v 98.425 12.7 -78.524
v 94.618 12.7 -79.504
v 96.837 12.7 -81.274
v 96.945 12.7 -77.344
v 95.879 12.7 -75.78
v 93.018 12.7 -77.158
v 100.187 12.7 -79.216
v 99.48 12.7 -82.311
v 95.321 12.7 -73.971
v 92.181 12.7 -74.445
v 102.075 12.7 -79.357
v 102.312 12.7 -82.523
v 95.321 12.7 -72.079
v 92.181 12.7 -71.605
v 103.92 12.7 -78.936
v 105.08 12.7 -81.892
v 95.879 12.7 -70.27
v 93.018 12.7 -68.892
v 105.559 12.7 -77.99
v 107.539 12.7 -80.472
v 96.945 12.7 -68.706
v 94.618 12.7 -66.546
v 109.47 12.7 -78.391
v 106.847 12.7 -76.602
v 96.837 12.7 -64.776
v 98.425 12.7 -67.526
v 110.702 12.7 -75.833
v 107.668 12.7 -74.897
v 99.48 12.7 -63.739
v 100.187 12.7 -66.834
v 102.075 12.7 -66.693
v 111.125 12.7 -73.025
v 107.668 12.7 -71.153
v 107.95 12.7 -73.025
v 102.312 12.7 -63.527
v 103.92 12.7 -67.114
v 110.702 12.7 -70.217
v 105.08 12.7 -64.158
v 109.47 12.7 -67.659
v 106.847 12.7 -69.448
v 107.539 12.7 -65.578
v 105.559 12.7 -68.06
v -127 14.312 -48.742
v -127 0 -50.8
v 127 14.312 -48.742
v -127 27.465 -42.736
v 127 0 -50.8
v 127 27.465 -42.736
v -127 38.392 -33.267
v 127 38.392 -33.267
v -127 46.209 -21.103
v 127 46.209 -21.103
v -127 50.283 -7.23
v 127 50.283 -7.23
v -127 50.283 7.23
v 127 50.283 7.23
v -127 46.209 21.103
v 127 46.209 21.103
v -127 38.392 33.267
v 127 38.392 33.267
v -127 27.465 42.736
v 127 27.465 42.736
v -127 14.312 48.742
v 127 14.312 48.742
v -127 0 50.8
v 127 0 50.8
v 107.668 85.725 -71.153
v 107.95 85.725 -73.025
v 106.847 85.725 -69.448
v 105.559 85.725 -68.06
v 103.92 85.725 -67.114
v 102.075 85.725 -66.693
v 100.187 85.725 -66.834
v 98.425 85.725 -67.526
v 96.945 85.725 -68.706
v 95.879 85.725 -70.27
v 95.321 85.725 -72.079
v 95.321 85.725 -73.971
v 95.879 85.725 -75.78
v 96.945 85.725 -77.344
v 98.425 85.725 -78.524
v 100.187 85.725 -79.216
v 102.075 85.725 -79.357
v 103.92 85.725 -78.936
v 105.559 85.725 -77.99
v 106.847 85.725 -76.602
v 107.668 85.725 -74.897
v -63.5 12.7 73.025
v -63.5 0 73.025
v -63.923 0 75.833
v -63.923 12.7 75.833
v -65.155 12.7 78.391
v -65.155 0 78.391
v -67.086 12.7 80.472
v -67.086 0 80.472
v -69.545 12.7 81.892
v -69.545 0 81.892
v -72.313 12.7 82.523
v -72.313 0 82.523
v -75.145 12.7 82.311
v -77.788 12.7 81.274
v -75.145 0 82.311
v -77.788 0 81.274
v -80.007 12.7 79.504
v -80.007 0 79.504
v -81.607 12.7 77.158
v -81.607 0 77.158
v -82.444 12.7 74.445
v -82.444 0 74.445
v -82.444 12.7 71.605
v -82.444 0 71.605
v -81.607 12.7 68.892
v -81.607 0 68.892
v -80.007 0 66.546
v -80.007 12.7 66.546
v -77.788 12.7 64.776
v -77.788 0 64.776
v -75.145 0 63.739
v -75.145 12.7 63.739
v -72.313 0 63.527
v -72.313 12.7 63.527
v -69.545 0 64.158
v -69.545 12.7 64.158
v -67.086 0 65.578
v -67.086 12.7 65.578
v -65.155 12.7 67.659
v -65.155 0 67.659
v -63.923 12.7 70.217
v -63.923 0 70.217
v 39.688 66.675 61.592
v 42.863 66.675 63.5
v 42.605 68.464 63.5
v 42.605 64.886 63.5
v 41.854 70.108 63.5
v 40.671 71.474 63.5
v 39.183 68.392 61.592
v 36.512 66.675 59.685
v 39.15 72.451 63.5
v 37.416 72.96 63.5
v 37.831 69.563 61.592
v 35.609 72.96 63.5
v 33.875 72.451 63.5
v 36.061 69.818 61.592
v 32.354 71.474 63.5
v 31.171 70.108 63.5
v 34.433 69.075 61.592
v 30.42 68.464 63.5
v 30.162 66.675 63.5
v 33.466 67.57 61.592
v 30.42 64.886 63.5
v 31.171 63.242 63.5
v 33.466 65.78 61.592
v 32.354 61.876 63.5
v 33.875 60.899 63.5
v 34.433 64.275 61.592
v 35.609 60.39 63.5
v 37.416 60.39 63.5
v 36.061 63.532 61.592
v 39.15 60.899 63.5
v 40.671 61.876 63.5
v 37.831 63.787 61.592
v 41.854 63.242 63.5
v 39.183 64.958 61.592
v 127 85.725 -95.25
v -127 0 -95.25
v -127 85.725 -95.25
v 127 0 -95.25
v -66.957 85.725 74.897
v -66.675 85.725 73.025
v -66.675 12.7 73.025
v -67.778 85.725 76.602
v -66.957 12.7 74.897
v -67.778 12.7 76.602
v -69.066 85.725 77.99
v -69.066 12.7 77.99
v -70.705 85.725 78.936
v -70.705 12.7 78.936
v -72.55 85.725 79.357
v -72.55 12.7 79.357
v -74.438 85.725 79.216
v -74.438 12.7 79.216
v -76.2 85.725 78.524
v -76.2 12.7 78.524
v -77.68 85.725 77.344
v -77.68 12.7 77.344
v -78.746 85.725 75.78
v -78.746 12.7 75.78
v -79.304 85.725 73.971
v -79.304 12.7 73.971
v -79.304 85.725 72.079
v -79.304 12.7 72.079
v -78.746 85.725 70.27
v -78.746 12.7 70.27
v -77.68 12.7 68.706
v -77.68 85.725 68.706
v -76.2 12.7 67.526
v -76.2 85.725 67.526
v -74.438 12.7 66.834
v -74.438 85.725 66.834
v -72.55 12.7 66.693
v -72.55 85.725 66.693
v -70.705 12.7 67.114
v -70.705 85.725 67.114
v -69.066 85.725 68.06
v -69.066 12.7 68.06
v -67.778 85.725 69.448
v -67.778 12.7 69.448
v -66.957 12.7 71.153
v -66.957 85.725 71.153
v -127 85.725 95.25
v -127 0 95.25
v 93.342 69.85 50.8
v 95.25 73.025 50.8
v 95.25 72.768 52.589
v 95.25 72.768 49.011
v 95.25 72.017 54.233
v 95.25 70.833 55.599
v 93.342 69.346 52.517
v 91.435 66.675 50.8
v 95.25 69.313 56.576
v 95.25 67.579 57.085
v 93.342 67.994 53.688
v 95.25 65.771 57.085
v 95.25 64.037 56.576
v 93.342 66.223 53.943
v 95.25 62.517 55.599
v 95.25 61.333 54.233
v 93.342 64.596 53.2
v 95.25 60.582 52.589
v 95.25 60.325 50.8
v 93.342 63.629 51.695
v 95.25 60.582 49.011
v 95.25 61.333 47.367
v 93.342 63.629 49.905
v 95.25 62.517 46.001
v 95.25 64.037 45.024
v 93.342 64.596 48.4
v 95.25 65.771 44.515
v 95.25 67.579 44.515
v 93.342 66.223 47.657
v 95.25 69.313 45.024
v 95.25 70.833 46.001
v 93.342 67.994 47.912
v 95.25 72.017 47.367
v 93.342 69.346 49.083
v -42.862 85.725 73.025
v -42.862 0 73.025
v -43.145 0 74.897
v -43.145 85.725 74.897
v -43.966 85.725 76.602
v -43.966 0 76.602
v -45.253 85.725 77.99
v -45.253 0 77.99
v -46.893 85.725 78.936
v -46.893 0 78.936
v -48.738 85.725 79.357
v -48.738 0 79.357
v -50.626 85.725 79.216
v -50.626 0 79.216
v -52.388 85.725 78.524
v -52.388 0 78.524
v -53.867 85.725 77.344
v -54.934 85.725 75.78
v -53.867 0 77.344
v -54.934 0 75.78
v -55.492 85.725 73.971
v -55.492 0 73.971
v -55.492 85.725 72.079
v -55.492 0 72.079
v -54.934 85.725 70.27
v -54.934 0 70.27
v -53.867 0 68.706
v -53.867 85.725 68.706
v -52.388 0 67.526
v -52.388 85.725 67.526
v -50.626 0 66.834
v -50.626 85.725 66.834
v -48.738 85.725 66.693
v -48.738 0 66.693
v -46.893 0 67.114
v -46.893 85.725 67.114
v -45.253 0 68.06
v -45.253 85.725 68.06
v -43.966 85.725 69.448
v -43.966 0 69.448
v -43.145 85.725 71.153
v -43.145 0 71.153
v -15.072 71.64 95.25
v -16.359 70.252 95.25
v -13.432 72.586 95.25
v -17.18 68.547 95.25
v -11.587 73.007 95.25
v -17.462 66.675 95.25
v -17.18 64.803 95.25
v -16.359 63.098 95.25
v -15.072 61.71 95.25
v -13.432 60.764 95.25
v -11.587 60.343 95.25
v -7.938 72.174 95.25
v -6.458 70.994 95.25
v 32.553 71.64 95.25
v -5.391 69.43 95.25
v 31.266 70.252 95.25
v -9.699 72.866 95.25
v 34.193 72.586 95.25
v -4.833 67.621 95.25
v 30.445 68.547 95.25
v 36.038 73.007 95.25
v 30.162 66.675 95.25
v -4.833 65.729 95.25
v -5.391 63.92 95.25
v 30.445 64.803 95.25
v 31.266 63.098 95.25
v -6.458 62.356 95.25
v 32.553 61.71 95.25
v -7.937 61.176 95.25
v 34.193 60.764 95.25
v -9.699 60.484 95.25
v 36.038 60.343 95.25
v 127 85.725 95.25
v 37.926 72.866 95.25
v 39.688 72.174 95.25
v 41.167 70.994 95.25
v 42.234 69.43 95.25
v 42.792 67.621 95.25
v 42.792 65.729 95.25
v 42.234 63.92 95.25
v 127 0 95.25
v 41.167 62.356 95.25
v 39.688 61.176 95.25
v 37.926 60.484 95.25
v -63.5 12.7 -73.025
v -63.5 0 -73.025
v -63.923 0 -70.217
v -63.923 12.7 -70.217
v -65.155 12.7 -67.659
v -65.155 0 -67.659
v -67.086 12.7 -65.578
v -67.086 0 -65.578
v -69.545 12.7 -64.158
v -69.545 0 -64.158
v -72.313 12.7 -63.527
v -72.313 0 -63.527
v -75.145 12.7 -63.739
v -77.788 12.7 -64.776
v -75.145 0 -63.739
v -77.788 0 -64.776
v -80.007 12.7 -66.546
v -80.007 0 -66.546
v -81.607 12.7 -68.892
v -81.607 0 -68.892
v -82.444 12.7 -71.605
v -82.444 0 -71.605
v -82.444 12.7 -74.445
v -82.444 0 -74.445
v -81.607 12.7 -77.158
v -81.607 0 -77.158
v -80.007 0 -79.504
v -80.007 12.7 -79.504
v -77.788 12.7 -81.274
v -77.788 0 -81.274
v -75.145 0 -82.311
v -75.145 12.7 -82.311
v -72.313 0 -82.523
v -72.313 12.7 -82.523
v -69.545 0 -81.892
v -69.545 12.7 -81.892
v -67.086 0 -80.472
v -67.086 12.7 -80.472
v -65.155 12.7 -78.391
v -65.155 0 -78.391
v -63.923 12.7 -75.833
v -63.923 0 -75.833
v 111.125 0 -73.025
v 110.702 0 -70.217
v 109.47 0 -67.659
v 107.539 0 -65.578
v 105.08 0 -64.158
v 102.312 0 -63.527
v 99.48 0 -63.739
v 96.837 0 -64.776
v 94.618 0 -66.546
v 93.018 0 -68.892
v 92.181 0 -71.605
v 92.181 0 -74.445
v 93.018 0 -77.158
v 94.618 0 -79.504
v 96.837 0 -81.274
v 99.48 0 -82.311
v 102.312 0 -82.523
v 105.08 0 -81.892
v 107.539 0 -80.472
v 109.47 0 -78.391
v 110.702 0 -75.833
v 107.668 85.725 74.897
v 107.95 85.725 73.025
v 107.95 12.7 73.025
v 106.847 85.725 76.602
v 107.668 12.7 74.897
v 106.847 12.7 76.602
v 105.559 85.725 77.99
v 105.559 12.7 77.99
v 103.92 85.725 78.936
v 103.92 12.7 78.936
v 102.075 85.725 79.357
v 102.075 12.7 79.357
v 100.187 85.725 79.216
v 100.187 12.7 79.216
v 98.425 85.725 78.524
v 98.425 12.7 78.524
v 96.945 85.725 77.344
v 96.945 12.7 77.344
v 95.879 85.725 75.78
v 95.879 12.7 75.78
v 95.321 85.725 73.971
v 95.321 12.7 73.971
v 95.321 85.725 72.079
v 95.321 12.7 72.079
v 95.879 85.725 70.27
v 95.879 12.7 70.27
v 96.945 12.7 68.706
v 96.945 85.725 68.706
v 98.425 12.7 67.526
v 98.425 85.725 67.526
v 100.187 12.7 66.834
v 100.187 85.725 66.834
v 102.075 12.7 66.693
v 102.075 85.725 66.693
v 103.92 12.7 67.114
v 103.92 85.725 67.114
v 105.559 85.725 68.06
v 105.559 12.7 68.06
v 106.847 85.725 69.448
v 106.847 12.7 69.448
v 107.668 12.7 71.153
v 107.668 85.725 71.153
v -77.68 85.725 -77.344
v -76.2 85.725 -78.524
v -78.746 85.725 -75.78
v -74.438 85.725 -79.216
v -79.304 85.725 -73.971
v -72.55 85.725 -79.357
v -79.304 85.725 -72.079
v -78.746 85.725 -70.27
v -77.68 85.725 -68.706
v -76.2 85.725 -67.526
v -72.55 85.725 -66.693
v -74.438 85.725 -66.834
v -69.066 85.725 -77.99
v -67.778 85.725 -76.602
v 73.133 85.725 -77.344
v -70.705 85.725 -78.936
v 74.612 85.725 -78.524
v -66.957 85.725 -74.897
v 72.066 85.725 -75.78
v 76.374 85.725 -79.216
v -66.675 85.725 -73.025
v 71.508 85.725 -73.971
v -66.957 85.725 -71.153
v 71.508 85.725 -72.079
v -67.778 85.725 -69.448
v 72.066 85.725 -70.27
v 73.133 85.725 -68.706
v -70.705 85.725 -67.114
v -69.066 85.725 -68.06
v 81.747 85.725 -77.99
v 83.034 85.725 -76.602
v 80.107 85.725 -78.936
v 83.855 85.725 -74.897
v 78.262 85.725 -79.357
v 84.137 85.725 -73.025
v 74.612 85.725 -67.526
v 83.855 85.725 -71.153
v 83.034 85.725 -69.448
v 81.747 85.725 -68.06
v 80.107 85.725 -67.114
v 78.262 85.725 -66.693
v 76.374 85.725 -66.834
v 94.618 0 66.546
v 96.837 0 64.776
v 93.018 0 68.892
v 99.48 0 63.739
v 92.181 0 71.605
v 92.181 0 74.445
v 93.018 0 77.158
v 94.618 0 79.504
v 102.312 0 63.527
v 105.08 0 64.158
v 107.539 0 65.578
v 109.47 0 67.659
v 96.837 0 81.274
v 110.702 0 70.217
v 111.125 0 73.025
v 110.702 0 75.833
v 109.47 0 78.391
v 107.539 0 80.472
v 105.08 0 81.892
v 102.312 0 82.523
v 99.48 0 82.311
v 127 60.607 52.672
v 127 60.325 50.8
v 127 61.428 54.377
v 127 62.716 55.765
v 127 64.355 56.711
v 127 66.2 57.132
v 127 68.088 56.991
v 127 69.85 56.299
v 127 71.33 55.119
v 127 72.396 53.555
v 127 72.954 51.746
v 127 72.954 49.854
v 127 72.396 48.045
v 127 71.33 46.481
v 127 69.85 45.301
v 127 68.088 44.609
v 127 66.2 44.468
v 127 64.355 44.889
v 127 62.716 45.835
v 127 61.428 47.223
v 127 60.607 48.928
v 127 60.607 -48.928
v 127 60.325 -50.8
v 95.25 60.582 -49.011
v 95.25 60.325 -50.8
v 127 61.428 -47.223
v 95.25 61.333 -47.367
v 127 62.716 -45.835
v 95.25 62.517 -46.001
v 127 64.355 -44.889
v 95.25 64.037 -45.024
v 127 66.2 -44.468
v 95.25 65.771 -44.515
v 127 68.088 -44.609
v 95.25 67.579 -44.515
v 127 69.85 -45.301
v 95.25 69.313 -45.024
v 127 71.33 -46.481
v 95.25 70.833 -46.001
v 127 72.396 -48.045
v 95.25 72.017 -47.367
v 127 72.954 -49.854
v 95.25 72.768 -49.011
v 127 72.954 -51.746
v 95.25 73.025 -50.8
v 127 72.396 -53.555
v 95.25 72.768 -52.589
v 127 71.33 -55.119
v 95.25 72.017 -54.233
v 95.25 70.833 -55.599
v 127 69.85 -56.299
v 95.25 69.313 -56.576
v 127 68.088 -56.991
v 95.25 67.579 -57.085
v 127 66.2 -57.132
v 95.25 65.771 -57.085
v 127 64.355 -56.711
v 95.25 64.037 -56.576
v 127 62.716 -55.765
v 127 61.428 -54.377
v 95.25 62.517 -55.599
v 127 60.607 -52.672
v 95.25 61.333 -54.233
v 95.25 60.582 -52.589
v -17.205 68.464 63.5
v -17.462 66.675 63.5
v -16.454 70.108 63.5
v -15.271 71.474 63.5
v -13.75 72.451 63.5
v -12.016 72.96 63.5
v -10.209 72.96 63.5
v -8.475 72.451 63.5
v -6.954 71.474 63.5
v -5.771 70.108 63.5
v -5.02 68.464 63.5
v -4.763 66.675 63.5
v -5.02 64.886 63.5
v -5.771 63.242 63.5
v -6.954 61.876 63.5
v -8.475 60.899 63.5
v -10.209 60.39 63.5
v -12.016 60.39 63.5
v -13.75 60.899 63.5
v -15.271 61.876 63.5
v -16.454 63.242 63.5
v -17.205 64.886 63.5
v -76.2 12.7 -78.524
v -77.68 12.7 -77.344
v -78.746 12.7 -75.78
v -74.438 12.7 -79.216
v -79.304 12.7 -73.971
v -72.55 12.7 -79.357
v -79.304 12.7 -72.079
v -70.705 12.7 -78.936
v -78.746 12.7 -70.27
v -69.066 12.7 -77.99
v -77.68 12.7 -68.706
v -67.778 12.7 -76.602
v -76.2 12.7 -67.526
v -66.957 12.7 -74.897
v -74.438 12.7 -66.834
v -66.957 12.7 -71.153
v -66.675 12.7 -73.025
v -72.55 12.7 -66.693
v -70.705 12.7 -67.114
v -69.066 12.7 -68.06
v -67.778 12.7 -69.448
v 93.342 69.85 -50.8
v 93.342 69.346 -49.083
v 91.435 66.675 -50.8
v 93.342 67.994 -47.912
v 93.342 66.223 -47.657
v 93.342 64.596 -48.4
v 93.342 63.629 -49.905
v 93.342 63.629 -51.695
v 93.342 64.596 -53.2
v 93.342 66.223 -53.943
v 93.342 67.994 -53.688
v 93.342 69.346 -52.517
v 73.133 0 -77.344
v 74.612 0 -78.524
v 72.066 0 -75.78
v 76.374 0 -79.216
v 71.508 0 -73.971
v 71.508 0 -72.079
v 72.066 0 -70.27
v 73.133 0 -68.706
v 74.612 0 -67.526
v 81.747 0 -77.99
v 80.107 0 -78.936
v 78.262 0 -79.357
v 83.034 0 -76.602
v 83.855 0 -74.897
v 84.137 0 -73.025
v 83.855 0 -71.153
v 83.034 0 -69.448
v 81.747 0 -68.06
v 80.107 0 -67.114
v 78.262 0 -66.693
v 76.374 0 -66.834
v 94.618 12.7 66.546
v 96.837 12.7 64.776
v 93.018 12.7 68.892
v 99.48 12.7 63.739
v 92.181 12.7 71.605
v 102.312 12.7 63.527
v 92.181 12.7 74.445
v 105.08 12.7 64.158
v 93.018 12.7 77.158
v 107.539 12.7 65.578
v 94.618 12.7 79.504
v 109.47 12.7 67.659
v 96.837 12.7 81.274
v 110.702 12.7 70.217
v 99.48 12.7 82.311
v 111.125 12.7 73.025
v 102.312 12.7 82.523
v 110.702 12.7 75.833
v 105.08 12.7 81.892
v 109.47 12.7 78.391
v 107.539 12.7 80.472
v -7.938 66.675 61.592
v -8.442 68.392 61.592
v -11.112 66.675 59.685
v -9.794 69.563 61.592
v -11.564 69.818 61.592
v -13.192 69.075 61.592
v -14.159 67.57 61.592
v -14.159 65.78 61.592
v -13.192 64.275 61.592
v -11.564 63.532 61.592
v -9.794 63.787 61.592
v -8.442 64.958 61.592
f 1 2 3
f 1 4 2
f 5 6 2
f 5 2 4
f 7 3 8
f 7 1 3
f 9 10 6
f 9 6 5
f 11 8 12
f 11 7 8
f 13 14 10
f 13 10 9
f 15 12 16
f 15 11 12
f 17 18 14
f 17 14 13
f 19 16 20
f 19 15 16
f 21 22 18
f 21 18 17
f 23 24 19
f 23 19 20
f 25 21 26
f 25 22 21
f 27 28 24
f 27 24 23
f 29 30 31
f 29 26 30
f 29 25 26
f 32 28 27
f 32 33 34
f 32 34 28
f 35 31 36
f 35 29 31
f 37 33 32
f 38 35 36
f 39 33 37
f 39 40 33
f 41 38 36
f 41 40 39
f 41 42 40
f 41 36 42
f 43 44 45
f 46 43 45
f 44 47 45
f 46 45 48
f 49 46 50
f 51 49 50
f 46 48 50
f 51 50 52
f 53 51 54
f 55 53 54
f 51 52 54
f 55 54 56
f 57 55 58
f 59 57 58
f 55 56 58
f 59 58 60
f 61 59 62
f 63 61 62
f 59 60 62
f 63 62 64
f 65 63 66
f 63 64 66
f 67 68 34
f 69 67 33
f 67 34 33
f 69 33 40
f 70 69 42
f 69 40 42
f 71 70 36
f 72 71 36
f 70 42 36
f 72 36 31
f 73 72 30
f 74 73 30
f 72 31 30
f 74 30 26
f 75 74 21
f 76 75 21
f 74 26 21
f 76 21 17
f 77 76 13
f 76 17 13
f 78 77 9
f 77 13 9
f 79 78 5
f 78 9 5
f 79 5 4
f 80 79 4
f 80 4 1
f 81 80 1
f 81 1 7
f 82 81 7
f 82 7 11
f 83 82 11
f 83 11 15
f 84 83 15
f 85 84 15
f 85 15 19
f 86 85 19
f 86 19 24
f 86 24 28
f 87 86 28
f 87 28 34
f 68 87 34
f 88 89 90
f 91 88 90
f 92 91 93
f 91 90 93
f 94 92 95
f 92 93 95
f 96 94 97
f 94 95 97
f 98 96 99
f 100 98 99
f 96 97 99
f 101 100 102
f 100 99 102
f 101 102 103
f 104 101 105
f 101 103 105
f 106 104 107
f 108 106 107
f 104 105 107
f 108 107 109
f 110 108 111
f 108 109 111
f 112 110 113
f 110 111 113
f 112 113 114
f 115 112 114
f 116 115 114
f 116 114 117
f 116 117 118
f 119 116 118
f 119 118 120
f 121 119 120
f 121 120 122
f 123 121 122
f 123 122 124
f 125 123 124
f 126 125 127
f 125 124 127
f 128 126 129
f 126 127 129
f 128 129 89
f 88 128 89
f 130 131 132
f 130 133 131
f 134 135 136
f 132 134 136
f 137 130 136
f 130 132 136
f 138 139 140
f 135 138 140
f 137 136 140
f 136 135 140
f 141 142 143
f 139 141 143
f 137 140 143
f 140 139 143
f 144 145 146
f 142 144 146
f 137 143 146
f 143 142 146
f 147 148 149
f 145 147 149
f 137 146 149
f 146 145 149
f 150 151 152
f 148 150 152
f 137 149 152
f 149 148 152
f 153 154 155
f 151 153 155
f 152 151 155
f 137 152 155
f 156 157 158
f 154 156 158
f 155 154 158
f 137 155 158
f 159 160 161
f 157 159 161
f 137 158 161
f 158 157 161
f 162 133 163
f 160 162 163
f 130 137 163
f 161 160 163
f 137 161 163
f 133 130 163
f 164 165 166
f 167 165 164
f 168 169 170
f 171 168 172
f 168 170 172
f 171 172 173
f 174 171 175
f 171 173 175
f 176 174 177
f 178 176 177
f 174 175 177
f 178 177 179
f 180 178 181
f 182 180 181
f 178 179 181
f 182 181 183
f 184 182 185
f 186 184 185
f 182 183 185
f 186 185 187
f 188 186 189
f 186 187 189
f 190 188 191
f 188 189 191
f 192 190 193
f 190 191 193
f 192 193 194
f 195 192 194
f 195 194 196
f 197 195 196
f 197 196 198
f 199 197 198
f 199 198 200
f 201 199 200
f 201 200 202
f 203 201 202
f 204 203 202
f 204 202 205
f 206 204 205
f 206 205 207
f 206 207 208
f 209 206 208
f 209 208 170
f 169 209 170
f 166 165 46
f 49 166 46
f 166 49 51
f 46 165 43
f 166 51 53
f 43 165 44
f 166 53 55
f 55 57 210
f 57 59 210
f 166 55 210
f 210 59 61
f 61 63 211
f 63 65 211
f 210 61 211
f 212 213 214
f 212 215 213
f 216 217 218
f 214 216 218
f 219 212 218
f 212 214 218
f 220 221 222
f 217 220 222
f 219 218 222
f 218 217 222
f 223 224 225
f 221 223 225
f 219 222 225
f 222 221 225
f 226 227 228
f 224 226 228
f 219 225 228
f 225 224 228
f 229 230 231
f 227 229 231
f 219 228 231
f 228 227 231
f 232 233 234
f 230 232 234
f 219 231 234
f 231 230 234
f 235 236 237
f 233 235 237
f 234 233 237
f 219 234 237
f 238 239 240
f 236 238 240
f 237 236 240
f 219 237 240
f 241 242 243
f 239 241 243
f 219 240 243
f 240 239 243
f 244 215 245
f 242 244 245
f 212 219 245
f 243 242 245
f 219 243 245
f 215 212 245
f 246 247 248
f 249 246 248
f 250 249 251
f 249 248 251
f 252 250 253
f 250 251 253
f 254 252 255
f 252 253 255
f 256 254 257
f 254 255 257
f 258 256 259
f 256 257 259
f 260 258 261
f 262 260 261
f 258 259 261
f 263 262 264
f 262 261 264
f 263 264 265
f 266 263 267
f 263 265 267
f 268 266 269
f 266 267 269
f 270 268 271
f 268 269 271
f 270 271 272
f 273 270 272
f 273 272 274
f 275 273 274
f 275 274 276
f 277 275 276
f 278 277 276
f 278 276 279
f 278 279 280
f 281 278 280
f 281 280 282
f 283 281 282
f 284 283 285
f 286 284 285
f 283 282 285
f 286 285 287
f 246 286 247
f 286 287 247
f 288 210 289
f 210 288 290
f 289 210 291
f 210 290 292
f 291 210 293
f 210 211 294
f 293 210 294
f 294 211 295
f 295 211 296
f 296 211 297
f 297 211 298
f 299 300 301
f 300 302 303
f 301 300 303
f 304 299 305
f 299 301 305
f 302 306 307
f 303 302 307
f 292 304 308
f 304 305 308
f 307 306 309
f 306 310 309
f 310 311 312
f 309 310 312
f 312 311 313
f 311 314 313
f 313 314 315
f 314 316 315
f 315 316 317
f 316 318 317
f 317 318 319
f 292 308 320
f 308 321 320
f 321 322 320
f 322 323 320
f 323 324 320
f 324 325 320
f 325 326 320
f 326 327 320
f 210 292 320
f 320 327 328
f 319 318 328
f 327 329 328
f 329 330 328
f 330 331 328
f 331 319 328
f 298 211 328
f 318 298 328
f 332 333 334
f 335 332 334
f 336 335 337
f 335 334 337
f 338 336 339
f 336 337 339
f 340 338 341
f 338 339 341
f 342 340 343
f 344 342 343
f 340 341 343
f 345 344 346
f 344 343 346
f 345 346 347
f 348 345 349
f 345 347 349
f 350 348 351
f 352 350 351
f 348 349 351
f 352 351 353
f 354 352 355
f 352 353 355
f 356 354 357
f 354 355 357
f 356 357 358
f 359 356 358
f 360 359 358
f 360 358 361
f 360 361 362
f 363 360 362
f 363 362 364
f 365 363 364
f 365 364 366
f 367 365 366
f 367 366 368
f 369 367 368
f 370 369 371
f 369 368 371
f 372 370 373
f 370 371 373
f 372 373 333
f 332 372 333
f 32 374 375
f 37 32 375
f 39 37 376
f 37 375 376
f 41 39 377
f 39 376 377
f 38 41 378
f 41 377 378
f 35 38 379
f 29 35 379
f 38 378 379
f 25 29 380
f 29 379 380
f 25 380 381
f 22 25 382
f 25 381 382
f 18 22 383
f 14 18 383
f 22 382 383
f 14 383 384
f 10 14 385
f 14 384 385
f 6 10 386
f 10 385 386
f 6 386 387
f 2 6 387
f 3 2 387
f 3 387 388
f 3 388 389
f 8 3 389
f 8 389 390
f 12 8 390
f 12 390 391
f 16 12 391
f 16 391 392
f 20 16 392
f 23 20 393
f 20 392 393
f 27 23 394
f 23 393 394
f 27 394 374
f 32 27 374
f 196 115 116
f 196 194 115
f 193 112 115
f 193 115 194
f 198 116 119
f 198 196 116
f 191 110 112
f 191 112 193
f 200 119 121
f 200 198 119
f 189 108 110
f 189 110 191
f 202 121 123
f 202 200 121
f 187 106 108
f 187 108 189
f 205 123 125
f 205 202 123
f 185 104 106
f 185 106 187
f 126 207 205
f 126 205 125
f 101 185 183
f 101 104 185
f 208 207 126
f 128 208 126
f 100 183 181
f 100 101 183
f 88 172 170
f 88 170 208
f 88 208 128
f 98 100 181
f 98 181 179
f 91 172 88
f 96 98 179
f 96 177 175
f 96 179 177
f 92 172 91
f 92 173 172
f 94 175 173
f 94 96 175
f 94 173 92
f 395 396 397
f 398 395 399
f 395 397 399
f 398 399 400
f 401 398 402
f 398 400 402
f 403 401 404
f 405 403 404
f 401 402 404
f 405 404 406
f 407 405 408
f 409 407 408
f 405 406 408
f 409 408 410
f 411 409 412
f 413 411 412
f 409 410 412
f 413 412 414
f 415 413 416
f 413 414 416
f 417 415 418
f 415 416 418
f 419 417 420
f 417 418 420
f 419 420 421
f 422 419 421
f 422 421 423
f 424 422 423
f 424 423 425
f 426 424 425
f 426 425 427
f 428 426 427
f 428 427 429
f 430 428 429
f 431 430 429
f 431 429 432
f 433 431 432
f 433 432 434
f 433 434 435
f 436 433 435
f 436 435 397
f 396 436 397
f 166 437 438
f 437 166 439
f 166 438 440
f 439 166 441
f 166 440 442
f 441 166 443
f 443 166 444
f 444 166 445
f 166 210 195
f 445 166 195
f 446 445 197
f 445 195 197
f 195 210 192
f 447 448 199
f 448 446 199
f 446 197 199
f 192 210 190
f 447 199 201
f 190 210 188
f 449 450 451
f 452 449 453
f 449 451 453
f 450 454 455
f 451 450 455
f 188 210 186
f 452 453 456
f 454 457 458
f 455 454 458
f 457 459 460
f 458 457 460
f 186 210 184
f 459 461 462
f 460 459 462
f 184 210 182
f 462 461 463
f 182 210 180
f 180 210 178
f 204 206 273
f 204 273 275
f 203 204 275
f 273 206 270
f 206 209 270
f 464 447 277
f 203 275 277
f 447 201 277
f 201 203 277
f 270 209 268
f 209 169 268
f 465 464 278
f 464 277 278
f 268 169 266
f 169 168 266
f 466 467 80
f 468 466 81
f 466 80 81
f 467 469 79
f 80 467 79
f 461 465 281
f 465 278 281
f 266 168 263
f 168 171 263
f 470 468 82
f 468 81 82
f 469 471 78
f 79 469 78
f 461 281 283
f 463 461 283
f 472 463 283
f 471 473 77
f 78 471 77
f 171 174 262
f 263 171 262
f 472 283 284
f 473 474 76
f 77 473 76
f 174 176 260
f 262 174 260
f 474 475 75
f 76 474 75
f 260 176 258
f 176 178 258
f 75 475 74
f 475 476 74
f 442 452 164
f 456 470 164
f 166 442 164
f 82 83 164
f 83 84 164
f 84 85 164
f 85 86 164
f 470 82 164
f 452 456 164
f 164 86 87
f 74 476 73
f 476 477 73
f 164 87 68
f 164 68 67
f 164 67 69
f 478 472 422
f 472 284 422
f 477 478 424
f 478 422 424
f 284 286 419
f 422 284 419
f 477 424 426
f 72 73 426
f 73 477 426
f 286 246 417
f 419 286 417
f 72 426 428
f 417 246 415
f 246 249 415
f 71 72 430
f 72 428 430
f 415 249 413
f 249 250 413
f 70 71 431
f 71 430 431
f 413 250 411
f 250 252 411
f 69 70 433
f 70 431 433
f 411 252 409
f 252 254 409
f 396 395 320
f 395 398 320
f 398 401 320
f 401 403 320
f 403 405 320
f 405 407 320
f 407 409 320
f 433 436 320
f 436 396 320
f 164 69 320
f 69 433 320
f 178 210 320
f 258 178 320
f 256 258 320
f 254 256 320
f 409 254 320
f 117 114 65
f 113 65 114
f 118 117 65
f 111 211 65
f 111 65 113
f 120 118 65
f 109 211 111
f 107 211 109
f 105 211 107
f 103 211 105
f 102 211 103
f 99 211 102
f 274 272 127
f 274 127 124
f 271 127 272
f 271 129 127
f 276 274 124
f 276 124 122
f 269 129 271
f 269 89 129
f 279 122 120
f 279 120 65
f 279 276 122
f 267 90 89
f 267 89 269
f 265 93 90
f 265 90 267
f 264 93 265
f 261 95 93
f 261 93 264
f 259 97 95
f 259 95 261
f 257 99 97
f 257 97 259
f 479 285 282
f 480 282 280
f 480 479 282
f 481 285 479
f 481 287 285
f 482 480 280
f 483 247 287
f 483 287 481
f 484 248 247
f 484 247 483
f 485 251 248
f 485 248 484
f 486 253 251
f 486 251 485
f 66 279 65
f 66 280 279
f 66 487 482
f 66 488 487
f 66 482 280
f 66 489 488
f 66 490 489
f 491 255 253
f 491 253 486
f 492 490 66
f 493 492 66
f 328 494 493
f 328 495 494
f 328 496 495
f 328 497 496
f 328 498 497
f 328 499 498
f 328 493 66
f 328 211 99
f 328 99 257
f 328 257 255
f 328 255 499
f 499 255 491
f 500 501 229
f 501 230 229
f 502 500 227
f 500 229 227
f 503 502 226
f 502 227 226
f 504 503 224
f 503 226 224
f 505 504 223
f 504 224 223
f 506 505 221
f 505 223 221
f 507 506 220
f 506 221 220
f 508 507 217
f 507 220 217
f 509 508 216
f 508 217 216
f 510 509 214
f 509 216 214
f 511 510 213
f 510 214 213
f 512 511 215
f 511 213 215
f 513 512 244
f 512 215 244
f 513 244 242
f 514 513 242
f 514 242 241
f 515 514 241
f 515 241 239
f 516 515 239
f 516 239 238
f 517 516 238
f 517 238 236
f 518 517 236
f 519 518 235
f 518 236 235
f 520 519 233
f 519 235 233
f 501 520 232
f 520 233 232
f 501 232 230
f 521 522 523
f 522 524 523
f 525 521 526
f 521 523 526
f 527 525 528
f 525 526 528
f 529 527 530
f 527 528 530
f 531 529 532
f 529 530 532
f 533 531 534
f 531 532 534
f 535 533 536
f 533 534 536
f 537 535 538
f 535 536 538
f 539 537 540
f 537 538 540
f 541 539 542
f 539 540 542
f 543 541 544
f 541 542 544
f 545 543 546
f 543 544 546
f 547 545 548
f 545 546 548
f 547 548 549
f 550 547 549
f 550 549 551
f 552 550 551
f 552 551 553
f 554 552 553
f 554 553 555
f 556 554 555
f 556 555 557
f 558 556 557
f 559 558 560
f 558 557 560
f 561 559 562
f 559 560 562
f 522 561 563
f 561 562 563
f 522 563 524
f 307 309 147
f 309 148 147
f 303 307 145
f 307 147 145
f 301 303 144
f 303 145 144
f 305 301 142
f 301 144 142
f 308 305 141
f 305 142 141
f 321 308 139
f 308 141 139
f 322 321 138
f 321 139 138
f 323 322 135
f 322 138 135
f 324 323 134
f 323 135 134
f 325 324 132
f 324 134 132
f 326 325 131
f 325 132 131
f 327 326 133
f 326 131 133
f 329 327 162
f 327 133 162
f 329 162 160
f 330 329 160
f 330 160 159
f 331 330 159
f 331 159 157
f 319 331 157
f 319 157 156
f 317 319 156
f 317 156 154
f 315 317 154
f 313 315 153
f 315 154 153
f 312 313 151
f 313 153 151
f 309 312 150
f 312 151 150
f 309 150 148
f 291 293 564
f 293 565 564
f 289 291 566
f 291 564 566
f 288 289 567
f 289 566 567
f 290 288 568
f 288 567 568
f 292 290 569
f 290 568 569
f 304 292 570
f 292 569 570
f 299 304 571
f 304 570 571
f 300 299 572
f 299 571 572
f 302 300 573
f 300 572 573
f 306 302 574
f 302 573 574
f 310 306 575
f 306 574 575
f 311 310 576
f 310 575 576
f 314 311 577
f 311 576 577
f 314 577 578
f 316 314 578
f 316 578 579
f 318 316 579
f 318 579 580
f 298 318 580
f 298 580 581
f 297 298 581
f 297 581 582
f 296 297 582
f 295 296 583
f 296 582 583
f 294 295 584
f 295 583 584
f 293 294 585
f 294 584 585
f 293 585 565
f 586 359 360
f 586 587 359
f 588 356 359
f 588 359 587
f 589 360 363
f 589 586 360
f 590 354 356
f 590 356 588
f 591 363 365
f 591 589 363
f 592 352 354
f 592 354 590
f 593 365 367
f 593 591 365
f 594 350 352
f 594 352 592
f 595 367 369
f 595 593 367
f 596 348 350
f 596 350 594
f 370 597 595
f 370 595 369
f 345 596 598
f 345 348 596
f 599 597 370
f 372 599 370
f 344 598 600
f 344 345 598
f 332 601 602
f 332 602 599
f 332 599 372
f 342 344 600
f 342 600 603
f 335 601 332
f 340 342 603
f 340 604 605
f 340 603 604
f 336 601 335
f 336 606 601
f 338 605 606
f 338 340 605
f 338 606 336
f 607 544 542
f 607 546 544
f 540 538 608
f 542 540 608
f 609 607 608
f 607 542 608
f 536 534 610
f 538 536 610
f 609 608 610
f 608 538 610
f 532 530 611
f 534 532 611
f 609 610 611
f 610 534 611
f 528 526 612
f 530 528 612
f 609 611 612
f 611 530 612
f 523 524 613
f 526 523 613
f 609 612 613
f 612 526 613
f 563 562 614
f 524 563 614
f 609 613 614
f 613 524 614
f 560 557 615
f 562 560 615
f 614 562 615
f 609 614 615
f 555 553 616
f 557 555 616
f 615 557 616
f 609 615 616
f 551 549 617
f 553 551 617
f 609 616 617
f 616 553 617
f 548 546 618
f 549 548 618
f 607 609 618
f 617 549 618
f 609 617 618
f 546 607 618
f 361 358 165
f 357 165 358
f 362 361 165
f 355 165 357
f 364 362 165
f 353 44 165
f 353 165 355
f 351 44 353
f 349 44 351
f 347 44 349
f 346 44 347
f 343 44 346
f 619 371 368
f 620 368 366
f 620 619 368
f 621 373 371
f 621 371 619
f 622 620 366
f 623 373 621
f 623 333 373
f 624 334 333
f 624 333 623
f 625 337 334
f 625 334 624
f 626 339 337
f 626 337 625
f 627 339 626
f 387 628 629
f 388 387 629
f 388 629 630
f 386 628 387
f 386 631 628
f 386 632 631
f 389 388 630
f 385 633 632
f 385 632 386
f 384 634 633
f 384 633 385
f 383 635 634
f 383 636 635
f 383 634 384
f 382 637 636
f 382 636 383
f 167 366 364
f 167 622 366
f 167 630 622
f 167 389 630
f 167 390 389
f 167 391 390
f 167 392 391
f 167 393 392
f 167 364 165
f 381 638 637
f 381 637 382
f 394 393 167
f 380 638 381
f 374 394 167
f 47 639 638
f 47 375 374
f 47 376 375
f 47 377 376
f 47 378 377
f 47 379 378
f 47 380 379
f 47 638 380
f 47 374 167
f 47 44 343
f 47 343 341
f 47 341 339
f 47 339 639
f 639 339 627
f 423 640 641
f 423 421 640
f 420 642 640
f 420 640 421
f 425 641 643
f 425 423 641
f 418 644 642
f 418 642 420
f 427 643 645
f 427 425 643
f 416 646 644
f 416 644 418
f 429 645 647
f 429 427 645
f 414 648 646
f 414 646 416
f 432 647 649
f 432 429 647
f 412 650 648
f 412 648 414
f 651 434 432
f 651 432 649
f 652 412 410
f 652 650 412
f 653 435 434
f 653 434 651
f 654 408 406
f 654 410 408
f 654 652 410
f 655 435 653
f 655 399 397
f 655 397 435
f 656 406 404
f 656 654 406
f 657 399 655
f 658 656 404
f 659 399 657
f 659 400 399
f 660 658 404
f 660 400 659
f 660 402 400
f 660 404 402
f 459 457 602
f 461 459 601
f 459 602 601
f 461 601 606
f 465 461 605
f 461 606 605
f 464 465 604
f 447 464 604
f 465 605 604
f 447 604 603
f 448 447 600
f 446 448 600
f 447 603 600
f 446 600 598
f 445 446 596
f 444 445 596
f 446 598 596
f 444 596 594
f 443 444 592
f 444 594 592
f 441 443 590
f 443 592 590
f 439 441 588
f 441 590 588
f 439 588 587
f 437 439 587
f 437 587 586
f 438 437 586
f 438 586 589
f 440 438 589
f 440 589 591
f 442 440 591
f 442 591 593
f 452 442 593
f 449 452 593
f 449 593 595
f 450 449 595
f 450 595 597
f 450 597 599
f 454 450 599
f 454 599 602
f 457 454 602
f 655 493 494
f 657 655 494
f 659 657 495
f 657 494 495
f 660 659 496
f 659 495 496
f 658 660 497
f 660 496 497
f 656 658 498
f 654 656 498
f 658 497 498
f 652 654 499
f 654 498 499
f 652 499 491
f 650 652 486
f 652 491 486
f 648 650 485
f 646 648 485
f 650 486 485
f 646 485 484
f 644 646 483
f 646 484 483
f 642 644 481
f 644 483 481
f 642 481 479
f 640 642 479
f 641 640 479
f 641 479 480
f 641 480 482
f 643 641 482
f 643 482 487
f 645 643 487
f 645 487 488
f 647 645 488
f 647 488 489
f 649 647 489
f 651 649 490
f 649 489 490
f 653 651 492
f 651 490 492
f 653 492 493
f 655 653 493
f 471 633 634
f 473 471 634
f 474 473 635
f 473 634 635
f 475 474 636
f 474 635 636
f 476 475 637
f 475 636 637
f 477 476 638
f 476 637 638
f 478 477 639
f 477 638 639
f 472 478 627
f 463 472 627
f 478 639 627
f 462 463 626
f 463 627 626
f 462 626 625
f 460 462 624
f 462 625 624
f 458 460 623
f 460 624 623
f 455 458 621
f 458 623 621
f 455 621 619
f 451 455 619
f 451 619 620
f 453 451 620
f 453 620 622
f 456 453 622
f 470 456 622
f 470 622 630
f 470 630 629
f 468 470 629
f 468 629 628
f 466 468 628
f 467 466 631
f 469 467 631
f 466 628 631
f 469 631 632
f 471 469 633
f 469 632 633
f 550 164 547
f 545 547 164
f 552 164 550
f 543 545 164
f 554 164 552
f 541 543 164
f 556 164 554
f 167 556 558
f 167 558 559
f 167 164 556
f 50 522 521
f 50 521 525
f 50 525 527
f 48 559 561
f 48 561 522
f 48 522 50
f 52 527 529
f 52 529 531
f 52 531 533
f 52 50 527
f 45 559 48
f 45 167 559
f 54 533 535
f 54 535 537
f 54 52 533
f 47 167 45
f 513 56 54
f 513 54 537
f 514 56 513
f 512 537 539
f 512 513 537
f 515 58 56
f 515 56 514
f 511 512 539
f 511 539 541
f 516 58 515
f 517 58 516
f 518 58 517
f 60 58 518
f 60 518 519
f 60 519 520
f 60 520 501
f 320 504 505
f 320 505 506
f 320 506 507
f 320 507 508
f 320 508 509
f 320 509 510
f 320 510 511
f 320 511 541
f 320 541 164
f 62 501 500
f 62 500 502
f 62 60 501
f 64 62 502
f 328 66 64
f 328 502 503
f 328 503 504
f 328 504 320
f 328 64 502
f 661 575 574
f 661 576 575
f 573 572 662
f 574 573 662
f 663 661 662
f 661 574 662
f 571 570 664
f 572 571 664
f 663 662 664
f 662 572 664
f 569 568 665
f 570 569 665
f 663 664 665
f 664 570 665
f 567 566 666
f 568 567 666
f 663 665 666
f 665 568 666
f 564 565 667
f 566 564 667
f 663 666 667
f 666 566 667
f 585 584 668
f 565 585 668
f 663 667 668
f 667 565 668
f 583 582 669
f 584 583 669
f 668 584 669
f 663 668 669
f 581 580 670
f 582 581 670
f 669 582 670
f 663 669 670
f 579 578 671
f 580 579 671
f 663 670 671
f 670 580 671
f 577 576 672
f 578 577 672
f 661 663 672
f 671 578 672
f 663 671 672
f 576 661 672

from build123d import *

# Parameters (mm, degrees)
F0_W      = 254
F0_H      = 190.5
F1_DEPTH  = 85.725
F3_DEPTH  = 127
F4_R      = 9.525
F5_DEPTH  = 12.7
F6_R      = 6.35
F7_DEPTH  = 85.725
F8_R      = 6.35
F9_R      = 6.35
F10_DEPTH = 82.55
F12_D     = 12.7
F12_DEPTH = 31.75
F12_TIP   = 3.8154649308
F14_D     = 12.7
F14_DEPTH = 31.75
F14_TIP   = 3.8154649308


with BuildPart() as f1:
    # F0 (on Front) → F1 (new body)
    with BuildSketch(Plane.XZ):
        Rectangle(F0_W, F0_H)
    extrude(amount=-F1_DEPTH)

    # F2 (on Right) → F3 (cut, symmetric)
    with BuildSketch(Plane.YZ):
        with BuildLine():
            Line((0, 0), (0, -50.8))
            ThreePointArc((0, -50.8), (50.8, 0), (0, 50.8))
            Line((0, 50.8), (0, 0))
        make_face()
    extrude(amount=F3_DEPTH, both=True, mode=Mode.SUBTRACT)

    # F4 (on face) → F5 (cut)
    with BuildSketch(Plane.XZ):
        with Locations((-73.025, 73.025)):
            Circle(F4_R)
        with Locations((-73.025, -73.025)):
            Circle(F4_R)
        with Locations((101.6, 73.025)):
            Circle(F4_R)
        with Locations((101.6, -73.025)):
            Circle(F4_R)
    extrude(amount=-F5_DEPTH, mode=Mode.SUBTRACT)

    # F6 (on face) → F7 (cut, through all)
    with BuildSketch(Plane.XZ):
        with Locations((-49.2125, 73.025)):
            Circle(F6_R)
        with Locations((77.7875, -73.025)):
            Circle(F6_R)
    extrude(amount=-F7_DEPTH, mode=Mode.SUBTRACT)

    # F8 (on face) + F9 (on face) → F10 (cut)
    with BuildSketch(Plane.XZ.offset(-12.7)):
        with Locations((-73.025, 73.025)):
            Circle(F8_R)
        with Locations((-73.025, -73.025)):
            Circle(F8_R)
    with BuildSketch(Plane.XZ.offset(-12.7)):
        with Locations((101.6, 73.025)):
            Circle(F9_R)
        with Locations((101.6, -73.025)):
            Circle(F9_R)
    extrude(amount=-F10_DEPTH, mode=Mode.SUBTRACT)

    # F12
    with Locations(Plane.XY.offset(95.25)):
        with Locations((-11.1125, 66.675), (36.5125, 66.675)):
            Hole(F12_D / 2, depth=F12_DEPTH)
            with Locations((0, 0, -(F12_DEPTH + F12_TIP / 2))):  # 118° drill point
                Cone(0, F12_D / 2, F12_TIP, mode=Mode.SUBTRACT)

    # F14
    with Locations(Plane.YZ.offset(127)):
        with Locations((66.675, 50.8), (66.675, -50.8)):
            Hole(F14_D / 2, depth=F14_DEPTH)
            with Locations((0, 0, -(F14_DEPTH + F14_TIP / 2))):  # 118° drill point
                Cone(0, F14_D / 2, F14_TIP, mode=Mode.SUBTRACT)


solid = f1.part
